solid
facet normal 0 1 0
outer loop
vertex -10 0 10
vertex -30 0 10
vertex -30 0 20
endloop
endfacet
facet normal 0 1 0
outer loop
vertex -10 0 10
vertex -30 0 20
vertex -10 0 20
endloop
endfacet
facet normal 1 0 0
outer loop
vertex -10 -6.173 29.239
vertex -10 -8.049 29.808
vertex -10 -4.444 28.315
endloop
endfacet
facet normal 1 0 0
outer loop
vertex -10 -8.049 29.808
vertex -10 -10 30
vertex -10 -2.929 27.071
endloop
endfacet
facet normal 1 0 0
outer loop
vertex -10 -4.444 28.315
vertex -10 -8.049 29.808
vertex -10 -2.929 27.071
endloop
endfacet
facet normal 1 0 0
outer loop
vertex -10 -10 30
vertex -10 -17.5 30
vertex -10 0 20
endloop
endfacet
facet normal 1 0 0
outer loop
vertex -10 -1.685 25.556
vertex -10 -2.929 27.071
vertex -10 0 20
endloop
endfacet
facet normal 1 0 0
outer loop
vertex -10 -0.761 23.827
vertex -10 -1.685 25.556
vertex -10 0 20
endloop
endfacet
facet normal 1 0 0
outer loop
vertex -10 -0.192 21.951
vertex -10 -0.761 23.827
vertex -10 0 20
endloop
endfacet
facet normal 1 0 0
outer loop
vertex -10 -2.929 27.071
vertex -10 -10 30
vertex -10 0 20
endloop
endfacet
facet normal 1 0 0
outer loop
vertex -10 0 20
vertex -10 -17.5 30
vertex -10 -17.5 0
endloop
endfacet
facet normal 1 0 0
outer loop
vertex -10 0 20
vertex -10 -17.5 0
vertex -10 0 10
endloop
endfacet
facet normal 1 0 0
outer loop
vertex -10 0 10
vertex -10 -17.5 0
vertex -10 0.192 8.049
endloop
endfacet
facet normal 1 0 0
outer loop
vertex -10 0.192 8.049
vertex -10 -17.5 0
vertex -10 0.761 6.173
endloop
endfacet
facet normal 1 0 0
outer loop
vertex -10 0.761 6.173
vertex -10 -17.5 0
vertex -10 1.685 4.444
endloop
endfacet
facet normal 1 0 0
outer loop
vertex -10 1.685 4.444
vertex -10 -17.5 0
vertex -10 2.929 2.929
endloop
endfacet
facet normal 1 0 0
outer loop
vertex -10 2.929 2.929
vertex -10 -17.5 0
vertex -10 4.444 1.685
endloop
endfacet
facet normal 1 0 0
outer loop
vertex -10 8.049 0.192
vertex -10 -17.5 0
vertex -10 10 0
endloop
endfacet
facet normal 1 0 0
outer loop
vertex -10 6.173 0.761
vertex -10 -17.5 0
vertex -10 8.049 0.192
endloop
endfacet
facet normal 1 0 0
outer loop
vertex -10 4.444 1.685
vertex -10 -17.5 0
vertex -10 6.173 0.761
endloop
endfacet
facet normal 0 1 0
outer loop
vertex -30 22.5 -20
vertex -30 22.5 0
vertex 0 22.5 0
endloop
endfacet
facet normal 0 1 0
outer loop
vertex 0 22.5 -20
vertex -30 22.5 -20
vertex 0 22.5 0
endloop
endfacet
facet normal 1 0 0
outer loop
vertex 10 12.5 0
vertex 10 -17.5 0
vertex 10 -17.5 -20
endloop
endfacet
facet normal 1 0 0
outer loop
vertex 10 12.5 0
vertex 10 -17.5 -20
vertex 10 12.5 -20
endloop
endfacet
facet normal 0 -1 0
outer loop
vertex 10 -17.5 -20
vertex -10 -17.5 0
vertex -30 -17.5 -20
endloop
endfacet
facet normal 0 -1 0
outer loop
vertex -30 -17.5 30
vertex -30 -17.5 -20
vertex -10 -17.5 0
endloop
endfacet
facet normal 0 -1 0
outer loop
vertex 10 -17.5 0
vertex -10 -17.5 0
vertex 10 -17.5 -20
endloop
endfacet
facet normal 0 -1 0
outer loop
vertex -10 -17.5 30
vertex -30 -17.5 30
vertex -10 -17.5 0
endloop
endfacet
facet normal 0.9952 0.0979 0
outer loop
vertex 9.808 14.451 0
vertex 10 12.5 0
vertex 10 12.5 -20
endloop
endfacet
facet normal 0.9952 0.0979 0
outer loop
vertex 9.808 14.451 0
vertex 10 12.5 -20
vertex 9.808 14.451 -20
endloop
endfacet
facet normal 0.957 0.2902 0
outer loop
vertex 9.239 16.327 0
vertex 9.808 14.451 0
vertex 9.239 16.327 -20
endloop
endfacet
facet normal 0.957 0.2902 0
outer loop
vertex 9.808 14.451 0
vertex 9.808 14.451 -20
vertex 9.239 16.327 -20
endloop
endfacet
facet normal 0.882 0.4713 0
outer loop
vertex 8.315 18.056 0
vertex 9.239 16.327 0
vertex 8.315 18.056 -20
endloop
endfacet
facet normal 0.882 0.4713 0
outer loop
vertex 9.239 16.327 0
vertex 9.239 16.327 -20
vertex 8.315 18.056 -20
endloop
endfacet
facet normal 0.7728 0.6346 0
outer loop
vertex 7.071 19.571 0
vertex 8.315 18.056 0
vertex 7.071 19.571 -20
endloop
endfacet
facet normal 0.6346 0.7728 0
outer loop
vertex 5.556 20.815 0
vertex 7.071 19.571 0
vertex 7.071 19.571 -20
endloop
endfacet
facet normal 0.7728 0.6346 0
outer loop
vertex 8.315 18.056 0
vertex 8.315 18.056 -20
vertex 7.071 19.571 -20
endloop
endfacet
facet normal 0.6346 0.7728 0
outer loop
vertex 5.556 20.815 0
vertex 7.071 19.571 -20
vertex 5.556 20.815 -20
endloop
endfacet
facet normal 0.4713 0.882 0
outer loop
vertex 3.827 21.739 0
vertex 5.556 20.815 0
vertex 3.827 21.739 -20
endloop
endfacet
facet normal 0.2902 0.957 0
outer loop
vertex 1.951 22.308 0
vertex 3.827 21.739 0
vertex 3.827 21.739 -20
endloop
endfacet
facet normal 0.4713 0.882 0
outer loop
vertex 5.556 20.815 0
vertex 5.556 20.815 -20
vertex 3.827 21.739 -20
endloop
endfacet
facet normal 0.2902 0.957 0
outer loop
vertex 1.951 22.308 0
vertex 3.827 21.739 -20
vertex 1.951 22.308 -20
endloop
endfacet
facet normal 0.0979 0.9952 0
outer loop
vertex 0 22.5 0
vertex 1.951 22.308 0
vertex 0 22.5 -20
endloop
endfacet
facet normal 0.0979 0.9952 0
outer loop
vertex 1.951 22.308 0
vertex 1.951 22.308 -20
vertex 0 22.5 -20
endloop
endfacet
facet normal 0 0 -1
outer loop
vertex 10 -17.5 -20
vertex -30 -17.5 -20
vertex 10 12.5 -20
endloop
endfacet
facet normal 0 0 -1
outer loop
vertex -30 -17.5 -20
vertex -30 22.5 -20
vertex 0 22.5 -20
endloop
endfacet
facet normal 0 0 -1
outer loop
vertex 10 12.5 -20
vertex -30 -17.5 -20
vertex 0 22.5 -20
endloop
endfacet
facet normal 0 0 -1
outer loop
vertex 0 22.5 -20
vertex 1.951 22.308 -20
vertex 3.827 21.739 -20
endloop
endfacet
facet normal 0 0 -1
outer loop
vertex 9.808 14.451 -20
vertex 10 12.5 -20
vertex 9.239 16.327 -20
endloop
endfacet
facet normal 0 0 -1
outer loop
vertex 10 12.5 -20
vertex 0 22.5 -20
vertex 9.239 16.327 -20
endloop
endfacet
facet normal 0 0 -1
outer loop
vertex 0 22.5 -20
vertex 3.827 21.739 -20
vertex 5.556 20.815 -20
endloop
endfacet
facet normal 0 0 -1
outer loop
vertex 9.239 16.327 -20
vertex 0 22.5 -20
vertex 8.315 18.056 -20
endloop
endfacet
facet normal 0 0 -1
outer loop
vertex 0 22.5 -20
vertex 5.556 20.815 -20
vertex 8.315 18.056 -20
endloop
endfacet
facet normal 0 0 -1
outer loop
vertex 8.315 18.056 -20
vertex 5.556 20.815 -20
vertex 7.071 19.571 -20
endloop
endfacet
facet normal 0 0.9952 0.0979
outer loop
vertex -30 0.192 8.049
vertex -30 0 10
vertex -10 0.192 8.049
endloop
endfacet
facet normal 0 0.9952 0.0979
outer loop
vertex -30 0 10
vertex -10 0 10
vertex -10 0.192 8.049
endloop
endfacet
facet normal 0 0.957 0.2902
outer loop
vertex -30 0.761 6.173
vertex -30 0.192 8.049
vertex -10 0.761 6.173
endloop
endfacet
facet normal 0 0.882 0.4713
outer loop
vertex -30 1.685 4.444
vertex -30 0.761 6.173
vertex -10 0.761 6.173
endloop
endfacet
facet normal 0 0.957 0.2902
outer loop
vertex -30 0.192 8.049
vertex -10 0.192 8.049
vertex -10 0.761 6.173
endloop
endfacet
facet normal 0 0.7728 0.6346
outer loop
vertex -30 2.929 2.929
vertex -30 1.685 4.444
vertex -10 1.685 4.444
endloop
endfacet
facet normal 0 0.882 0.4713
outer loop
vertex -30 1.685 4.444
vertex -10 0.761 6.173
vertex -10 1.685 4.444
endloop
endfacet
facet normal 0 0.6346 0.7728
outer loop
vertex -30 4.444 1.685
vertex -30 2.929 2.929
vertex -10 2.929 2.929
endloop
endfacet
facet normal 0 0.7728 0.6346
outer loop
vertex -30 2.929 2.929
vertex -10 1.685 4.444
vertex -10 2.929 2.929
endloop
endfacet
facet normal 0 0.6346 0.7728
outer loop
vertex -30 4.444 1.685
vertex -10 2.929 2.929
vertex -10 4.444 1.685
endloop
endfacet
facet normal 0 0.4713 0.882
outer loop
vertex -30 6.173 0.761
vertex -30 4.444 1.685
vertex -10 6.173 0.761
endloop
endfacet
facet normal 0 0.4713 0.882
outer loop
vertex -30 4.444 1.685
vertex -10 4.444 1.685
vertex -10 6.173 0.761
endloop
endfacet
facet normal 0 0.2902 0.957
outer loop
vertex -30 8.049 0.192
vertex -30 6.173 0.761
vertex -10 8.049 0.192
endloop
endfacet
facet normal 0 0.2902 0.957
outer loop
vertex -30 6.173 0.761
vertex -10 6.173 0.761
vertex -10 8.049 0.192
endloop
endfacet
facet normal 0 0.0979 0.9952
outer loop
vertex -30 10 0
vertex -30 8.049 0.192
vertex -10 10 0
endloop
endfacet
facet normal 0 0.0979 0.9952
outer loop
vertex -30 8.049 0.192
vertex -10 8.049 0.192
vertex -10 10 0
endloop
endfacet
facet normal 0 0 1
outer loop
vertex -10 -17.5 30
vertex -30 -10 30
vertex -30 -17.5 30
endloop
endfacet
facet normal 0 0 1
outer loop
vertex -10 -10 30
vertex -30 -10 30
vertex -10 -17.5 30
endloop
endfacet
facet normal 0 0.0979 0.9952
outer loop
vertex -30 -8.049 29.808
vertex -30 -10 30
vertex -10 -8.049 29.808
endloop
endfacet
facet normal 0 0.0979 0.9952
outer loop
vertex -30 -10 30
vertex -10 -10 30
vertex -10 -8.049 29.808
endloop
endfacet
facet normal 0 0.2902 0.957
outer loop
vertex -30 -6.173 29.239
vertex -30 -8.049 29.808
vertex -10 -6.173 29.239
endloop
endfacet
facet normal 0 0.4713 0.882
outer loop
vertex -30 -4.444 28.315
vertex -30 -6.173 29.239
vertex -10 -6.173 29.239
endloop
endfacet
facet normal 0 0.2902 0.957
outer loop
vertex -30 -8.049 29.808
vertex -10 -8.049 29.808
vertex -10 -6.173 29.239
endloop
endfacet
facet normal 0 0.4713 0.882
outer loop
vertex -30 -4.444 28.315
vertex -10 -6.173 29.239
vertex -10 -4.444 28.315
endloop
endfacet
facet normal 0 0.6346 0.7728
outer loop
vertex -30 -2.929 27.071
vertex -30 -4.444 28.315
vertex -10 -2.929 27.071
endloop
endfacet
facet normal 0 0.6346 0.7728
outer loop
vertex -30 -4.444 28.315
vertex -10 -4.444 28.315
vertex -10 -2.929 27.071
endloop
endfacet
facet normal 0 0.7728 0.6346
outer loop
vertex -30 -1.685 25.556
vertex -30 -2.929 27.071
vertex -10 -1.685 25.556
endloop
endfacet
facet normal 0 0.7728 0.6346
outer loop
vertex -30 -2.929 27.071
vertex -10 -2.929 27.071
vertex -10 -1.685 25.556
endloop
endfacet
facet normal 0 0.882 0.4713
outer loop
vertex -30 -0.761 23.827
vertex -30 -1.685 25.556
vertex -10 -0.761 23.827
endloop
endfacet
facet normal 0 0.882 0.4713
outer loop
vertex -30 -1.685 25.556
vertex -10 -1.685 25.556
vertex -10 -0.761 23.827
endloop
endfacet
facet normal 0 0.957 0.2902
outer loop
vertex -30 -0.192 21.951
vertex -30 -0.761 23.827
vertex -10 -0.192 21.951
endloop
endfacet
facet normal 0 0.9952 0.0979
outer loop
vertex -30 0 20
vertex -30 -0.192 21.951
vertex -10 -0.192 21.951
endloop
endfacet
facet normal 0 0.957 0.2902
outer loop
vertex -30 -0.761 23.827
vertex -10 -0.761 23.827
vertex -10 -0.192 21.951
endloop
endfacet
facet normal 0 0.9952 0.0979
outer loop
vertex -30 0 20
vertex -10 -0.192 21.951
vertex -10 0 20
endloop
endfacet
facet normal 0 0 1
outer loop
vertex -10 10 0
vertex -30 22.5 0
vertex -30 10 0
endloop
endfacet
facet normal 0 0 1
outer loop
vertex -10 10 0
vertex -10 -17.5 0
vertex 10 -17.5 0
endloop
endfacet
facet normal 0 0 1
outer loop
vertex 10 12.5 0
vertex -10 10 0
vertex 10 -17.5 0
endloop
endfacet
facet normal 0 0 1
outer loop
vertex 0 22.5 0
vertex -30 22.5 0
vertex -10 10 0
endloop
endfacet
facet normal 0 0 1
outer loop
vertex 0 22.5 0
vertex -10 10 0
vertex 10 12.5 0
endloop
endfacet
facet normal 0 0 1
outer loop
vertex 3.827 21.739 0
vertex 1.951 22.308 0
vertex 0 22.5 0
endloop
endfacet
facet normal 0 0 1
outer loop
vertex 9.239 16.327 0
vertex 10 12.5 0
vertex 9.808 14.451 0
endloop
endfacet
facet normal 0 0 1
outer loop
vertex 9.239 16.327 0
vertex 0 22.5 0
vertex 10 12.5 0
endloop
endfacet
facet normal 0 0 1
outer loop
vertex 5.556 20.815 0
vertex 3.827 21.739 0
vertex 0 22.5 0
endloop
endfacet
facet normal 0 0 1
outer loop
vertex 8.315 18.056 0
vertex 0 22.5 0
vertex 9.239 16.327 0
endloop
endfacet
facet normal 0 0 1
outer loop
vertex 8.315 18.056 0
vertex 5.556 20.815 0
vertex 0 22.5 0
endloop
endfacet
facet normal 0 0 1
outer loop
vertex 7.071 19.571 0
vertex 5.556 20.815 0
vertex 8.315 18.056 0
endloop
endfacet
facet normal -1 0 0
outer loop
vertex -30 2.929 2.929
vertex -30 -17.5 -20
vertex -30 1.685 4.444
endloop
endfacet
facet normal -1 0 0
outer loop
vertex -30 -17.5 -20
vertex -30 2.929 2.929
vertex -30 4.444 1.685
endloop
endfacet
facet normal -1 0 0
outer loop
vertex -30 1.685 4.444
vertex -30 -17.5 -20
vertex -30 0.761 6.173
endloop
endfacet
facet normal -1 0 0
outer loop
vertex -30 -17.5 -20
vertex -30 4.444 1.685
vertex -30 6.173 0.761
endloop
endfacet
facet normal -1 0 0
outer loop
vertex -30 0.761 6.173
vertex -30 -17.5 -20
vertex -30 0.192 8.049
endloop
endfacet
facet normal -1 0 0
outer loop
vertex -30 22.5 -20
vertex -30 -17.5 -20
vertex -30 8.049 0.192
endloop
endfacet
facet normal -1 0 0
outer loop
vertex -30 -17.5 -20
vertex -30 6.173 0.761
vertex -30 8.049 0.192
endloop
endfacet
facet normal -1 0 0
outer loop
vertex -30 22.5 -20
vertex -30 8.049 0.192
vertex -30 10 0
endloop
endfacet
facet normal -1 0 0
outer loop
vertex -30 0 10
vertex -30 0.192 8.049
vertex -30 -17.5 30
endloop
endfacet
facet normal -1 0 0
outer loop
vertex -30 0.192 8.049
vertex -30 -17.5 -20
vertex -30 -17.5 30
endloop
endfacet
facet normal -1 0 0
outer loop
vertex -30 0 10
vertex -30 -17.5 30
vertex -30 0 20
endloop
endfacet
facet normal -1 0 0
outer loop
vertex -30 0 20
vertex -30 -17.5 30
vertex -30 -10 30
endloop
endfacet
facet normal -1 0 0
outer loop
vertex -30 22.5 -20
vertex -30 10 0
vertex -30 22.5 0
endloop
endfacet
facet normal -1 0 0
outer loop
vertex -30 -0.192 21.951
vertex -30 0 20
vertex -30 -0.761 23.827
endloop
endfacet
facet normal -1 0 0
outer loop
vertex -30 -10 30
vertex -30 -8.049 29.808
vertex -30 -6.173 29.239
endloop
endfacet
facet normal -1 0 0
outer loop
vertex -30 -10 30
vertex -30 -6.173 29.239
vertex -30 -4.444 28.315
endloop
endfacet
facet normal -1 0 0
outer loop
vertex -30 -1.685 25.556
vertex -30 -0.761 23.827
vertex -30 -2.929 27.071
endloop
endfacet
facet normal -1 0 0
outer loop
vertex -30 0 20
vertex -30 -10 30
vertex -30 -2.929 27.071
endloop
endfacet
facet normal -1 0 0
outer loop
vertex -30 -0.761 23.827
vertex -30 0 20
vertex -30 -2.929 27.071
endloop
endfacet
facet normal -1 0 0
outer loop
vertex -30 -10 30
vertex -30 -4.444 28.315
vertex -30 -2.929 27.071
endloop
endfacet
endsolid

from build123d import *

# Parameters (mm, degrees)
SKETCH1_W           = 20
SKETCH1_H           = 17.5
BOSS_EXTRUDE1_DEPTH = 30
SKETCH2_W           = 40
SKETCH2_H           = 40
BOSS_EXTRUDE2_DEPTH = 20
FILLET1_R           = 10


with BuildPart() as part:
    # Sketch1 → Boss-Extrude1 (new body)
    with BuildSketch(Plane.XY):
        with Locations((-20, -8.75)):
            Rectangle(SKETCH1_W, SKETCH1_H)
    extrude(amount=BOSS_EXTRUDE1_DEPTH)

    # Sketch2 → Boss-Extrude2 (add)
    with BuildSketch(Plane.XY):
        with Locations((-10, 2.5)):
            Rectangle(SKETCH2_W, SKETCH2_H)
    extrude(amount=-BOSS_EXTRUDE2_DEPTH)

    # Fillet1
    fillet1_edges = [part.edges().sort_by_distance(p)[0] for p in [
        (10, 22.5, -10),
        (-20, 0, 30),
        (-20, 0, 0),
    ]]
    fillet(fillet1_edges, radius=FILLET1_R)


solid = part.part
